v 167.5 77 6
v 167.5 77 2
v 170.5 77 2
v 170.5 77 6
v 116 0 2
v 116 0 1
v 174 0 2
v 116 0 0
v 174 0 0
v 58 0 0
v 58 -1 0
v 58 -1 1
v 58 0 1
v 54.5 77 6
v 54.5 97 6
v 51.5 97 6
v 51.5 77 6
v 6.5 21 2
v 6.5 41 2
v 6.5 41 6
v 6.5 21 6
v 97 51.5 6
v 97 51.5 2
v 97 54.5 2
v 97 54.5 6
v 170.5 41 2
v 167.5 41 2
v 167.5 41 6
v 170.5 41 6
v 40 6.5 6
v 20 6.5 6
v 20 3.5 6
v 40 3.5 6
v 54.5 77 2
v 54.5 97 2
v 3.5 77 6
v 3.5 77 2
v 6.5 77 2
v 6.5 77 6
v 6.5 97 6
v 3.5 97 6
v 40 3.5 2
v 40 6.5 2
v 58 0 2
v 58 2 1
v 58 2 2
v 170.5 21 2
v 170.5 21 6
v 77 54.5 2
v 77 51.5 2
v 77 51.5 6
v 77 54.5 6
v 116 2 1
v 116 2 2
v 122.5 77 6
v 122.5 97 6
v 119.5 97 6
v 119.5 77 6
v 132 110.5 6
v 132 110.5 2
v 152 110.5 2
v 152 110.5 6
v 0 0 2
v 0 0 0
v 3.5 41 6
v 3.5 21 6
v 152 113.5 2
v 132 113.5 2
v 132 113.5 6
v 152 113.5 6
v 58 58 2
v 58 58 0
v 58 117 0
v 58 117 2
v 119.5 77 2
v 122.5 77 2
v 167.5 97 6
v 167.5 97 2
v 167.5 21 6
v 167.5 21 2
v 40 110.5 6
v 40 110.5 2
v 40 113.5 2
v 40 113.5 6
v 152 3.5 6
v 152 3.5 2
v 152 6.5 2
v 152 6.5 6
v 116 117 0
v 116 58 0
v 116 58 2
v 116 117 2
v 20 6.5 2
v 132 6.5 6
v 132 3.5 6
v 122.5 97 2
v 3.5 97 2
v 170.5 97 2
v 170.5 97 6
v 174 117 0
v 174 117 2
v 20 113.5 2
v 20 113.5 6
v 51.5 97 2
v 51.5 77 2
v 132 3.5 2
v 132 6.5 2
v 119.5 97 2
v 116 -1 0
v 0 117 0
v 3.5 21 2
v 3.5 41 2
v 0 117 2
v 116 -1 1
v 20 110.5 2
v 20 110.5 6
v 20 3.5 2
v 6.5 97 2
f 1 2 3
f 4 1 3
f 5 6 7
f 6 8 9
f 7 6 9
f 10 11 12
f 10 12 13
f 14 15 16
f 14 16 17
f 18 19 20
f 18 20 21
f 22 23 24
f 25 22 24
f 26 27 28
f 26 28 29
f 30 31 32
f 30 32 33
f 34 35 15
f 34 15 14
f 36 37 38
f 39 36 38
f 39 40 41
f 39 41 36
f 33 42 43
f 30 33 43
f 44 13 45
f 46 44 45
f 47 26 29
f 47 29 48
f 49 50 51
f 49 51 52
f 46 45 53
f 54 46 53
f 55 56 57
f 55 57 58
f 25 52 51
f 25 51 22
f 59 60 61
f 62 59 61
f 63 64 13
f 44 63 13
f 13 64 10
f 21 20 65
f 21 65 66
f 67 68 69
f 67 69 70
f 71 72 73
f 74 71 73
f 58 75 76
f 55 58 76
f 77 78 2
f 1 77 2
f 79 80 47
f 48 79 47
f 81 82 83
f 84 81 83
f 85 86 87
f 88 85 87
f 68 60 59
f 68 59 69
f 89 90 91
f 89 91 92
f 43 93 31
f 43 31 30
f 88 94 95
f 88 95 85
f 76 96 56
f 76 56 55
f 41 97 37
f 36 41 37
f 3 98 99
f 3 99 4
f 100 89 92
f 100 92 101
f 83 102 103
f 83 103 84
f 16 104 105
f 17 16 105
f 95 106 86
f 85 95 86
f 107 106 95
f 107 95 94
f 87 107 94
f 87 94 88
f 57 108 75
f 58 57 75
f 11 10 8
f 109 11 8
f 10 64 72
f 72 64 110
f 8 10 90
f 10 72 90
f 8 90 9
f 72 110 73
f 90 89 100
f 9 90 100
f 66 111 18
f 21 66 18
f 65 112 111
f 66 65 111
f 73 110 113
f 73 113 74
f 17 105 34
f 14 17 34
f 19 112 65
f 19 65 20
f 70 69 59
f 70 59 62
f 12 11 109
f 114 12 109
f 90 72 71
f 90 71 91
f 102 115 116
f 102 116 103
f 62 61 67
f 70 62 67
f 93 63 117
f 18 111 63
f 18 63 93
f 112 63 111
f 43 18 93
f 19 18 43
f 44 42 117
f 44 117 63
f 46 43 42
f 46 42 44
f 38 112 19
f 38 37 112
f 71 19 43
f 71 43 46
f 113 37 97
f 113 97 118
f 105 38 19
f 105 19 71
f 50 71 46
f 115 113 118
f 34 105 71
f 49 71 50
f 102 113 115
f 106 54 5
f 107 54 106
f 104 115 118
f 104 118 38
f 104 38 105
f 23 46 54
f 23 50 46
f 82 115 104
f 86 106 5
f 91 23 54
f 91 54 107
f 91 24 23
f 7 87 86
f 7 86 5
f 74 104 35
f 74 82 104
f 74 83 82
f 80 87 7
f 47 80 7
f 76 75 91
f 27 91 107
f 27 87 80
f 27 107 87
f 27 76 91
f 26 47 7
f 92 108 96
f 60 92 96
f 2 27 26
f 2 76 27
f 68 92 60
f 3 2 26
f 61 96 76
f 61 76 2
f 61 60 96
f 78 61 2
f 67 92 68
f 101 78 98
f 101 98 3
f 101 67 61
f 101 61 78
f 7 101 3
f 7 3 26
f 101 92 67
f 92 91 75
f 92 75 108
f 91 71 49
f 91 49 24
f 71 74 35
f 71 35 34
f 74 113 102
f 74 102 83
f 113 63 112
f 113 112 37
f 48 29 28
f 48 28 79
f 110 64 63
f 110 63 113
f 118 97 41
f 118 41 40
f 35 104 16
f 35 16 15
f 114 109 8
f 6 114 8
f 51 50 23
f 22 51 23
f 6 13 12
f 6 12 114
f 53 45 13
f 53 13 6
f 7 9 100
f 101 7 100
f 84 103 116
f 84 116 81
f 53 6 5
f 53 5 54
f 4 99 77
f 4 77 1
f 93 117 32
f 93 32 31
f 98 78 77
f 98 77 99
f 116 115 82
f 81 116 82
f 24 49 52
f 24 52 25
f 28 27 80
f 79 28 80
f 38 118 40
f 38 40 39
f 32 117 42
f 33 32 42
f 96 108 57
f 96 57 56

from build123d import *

# Parameters (mm, degrees)
BOX013_W     = 20
BOX013_H     = 3
BOX013_DEPTH = 6
BOX012_W     = 20
BOX012_H     = 3
BOX012_DEPTH = 6
BOX011_W     = 20
BOX011_H     = 3
BOX011_DEPTH = 6
BOX010_W     = 20
BOX010_H     = 3
BOX010_DEPTH = 6
BOX009_W     = 20
BOX009_H     = 3
BOX009_DEPTH = 6
BOX008_W     = 20
BOX008_H     = 3
BOX008_DEPTH = 6
BOX007_W     = 20
BOX007_H     = 3
BOX007_DEPTH = 6
BOX006_W     = 20
BOX006_H     = 3
BOX006_DEPTH = 6
BOX005_W     = 20
BOX005_H     = 3
BOX005_DEPTH = 6
BOX004_W     = 20
BOX004_H     = 3
BOX004_DEPTH = 6
BOX003_W     = 20
BOX003_H     = 3
BOX003_DEPTH = 6
BOX002_W     = 58
BOX002_H     = 117
BOX002_DEPTH = 2
BOX001_W     = 58
BOX001_H     = 117
BOX001_DEPTH = 2
BOX_W        = 58
BOX_H        = 56
BOX_DEPTH    = 2
BOX014_W     = 58
BOX014_H     = 3
BOX014_DEPTH = 1


with BuildPart() as cube013:
    # Box013 → Box013 (new body)
    with BuildSketch(Plane(origin=(77, 51.5, 0), x_dir=(1, 0, 0), z_dir=(0, 0, 1))):
        with Locations((10, 1.5)):
            Rectangle(BOX013_W, BOX013_H)
    extrude(amount=BOX013_DEPTH)


with BuildPart() as cube012:
    # Box012 → Box012 (new body)
    with BuildSketch(Plane(origin=(3.5, 41, 0), x_dir=(0, -1, 0), z_dir=(0, 0, 1))):
        with Locations((10, 1.5)):
            Rectangle(BOX012_W, BOX012_H)
    extrude(amount=BOX012_DEPTH)


with BuildPart() as cube011:
    # Box011 → Box011 (new body)
    with BuildSketch(Plane(origin=(3.5, 97, 0), x_dir=(0, -1, 0), z_dir=(0, 0, 1))):
        with Locations((10, 1.5)):
            Rectangle(BOX011_W, BOX011_H)
    extrude(amount=BOX011_DEPTH)


with BuildPart() as cube010:
    # Box010 → Box010 (new body)
    with BuildSketch(Plane(origin=(51.5, 97, 0), x_dir=(0, -1, 0), z_dir=(0, 0, 1))):
        with Locations((10, 1.5)):
            Rectangle(BOX010_W, BOX010_H)
    extrude(amount=BOX010_DEPTH)


with BuildPart() as cube009:
    # Box009 → Box009 (new body)
    with BuildSketch(Plane(origin=(167.5, 97, 0), x_dir=(0, -1, 0), z_dir=(0, 0, 1))):
        with Locations((10, 1.5)):
            Rectangle(BOX009_W, BOX009_H)
    extrude(amount=BOX009_DEPTH)


with BuildPart() as cube008:
    # Box008 → Box008 (new body)
    with BuildSketch(Plane(origin=(167.5, 41, 0), x_dir=(0, -1, 0), z_dir=(0, 0, 1))):
        with Locations((10, 1.5)):
            Rectangle(BOX008_W, BOX008_H)
    extrude(amount=BOX008_DEPTH)


with BuildPart() as cube007:
    # Box007 → Box007 (new body)
    with BuildSketch(Plane(origin=(119.5, 97, 0), x_dir=(0, -1, 0), z_dir=(0, 0, 1))):
        with Locations((10, 1.5)):
            Rectangle(BOX007_W, BOX007_H)
    extrude(amount=BOX007_DEPTH)


with BuildPart() as cube006:
    # Box006 → Box006 (new body)
    with BuildSketch(Plane(origin=(132, 110.5, 0), x_dir=(1, 0, 0), z_dir=(0, 0, 1))):
        with Locations((10, 1.5)):
            Rectangle(BOX006_W, BOX006_H)
    extrude(amount=BOX006_DEPTH)


with BuildPart() as cube005:
    # Box005 → Box005 (new body)
    with BuildSketch(Plane(origin=(132, 3.5, 0), x_dir=(1, 0, 0), z_dir=(0, 0, 1))):
        with Locations((10, 1.5)):
            Rectangle(BOX005_W, BOX005_H)
    extrude(amount=BOX005_DEPTH)


with BuildPart() as cube004:
    # Box004 → Box004 (new body)
    with BuildSketch(Plane(origin=(20, 3.5, 0), x_dir=(1, 0, 0), z_dir=(0, 0, 1))):
        with Locations((10, 1.5)):
            Rectangle(BOX004_W, BOX004_H)
    extrude(amount=BOX004_DEPTH)


with BuildPart() as cube003:
    # Box003 → Box003 (new body)
    with BuildSketch(Plane(origin=(20, 110.5, 0), x_dir=(1, 0, 0), z_dir=(0, 0, 1))):
        with Locations((10, 1.5)):
            Rectangle(BOX003_W, BOX003_H)
    extrude(amount=BOX003_DEPTH)


with BuildPart() as cube002:
    # Box002 → Box002 (new body)
    with BuildSketch(Plane(origin=(116, 0, 0), x_dir=(1, 0, 0), z_dir=(0, 0, 1))):
        with Locations((29, 58.5)):
            Rectangle(BOX002_W, BOX002_H)
    extrude(amount=BOX002_DEPTH)


with BuildPart() as cube001:
    # Box001 → Box001 (new body)
    with BuildSketch(Plane.XY):
        with Locations((29, 58.5)):
            Rectangle(BOX001_W, BOX001_H)
    extrude(amount=BOX001_DEPTH)


with BuildPart() as cube:
    # Box → Box (new body)
    with BuildSketch(Plane(origin=(58, 2, 0), x_dir=(1, 0, 0), z_dir=(0, 0, 1))):
        with Locations((29, 28)):
            Rectangle(BOX_W, BOX_H)
    extrude(amount=BOX_DEPTH)


with BuildPart() as fusion:
    # Box014 → Box014 (new body)
    with BuildSketch(Plane(origin=(58, -1, 0), x_dir=(1, 0, 0), z_dir=(0, 0, 1))):
        with Locations((29, 1.5)):
            Rectangle(BOX014_W, BOX014_H)
    extrude(amount=BOX014_DEPTH)

    # Fusion: union Cube013, Cube012, Cube011, Cube010, Cube009, Cube008, Cube007, Cube006, Cube005, Cube004, Cube003, Cube002, Cube001, Cube
    add(cube013.part)
    add(cube012.part)
    add(cube011.part)
    add(cube010.part)
    add(cube009.part)
    add(cube008.part)
    add(cube007.part)
    add(cube006.part)
    add(cube005.part)
    add(cube004.part)
    add(cube003.part)
    add(cube002.part)
    add(cube001.part)
    add(cube.part)


solid = fusion.part
